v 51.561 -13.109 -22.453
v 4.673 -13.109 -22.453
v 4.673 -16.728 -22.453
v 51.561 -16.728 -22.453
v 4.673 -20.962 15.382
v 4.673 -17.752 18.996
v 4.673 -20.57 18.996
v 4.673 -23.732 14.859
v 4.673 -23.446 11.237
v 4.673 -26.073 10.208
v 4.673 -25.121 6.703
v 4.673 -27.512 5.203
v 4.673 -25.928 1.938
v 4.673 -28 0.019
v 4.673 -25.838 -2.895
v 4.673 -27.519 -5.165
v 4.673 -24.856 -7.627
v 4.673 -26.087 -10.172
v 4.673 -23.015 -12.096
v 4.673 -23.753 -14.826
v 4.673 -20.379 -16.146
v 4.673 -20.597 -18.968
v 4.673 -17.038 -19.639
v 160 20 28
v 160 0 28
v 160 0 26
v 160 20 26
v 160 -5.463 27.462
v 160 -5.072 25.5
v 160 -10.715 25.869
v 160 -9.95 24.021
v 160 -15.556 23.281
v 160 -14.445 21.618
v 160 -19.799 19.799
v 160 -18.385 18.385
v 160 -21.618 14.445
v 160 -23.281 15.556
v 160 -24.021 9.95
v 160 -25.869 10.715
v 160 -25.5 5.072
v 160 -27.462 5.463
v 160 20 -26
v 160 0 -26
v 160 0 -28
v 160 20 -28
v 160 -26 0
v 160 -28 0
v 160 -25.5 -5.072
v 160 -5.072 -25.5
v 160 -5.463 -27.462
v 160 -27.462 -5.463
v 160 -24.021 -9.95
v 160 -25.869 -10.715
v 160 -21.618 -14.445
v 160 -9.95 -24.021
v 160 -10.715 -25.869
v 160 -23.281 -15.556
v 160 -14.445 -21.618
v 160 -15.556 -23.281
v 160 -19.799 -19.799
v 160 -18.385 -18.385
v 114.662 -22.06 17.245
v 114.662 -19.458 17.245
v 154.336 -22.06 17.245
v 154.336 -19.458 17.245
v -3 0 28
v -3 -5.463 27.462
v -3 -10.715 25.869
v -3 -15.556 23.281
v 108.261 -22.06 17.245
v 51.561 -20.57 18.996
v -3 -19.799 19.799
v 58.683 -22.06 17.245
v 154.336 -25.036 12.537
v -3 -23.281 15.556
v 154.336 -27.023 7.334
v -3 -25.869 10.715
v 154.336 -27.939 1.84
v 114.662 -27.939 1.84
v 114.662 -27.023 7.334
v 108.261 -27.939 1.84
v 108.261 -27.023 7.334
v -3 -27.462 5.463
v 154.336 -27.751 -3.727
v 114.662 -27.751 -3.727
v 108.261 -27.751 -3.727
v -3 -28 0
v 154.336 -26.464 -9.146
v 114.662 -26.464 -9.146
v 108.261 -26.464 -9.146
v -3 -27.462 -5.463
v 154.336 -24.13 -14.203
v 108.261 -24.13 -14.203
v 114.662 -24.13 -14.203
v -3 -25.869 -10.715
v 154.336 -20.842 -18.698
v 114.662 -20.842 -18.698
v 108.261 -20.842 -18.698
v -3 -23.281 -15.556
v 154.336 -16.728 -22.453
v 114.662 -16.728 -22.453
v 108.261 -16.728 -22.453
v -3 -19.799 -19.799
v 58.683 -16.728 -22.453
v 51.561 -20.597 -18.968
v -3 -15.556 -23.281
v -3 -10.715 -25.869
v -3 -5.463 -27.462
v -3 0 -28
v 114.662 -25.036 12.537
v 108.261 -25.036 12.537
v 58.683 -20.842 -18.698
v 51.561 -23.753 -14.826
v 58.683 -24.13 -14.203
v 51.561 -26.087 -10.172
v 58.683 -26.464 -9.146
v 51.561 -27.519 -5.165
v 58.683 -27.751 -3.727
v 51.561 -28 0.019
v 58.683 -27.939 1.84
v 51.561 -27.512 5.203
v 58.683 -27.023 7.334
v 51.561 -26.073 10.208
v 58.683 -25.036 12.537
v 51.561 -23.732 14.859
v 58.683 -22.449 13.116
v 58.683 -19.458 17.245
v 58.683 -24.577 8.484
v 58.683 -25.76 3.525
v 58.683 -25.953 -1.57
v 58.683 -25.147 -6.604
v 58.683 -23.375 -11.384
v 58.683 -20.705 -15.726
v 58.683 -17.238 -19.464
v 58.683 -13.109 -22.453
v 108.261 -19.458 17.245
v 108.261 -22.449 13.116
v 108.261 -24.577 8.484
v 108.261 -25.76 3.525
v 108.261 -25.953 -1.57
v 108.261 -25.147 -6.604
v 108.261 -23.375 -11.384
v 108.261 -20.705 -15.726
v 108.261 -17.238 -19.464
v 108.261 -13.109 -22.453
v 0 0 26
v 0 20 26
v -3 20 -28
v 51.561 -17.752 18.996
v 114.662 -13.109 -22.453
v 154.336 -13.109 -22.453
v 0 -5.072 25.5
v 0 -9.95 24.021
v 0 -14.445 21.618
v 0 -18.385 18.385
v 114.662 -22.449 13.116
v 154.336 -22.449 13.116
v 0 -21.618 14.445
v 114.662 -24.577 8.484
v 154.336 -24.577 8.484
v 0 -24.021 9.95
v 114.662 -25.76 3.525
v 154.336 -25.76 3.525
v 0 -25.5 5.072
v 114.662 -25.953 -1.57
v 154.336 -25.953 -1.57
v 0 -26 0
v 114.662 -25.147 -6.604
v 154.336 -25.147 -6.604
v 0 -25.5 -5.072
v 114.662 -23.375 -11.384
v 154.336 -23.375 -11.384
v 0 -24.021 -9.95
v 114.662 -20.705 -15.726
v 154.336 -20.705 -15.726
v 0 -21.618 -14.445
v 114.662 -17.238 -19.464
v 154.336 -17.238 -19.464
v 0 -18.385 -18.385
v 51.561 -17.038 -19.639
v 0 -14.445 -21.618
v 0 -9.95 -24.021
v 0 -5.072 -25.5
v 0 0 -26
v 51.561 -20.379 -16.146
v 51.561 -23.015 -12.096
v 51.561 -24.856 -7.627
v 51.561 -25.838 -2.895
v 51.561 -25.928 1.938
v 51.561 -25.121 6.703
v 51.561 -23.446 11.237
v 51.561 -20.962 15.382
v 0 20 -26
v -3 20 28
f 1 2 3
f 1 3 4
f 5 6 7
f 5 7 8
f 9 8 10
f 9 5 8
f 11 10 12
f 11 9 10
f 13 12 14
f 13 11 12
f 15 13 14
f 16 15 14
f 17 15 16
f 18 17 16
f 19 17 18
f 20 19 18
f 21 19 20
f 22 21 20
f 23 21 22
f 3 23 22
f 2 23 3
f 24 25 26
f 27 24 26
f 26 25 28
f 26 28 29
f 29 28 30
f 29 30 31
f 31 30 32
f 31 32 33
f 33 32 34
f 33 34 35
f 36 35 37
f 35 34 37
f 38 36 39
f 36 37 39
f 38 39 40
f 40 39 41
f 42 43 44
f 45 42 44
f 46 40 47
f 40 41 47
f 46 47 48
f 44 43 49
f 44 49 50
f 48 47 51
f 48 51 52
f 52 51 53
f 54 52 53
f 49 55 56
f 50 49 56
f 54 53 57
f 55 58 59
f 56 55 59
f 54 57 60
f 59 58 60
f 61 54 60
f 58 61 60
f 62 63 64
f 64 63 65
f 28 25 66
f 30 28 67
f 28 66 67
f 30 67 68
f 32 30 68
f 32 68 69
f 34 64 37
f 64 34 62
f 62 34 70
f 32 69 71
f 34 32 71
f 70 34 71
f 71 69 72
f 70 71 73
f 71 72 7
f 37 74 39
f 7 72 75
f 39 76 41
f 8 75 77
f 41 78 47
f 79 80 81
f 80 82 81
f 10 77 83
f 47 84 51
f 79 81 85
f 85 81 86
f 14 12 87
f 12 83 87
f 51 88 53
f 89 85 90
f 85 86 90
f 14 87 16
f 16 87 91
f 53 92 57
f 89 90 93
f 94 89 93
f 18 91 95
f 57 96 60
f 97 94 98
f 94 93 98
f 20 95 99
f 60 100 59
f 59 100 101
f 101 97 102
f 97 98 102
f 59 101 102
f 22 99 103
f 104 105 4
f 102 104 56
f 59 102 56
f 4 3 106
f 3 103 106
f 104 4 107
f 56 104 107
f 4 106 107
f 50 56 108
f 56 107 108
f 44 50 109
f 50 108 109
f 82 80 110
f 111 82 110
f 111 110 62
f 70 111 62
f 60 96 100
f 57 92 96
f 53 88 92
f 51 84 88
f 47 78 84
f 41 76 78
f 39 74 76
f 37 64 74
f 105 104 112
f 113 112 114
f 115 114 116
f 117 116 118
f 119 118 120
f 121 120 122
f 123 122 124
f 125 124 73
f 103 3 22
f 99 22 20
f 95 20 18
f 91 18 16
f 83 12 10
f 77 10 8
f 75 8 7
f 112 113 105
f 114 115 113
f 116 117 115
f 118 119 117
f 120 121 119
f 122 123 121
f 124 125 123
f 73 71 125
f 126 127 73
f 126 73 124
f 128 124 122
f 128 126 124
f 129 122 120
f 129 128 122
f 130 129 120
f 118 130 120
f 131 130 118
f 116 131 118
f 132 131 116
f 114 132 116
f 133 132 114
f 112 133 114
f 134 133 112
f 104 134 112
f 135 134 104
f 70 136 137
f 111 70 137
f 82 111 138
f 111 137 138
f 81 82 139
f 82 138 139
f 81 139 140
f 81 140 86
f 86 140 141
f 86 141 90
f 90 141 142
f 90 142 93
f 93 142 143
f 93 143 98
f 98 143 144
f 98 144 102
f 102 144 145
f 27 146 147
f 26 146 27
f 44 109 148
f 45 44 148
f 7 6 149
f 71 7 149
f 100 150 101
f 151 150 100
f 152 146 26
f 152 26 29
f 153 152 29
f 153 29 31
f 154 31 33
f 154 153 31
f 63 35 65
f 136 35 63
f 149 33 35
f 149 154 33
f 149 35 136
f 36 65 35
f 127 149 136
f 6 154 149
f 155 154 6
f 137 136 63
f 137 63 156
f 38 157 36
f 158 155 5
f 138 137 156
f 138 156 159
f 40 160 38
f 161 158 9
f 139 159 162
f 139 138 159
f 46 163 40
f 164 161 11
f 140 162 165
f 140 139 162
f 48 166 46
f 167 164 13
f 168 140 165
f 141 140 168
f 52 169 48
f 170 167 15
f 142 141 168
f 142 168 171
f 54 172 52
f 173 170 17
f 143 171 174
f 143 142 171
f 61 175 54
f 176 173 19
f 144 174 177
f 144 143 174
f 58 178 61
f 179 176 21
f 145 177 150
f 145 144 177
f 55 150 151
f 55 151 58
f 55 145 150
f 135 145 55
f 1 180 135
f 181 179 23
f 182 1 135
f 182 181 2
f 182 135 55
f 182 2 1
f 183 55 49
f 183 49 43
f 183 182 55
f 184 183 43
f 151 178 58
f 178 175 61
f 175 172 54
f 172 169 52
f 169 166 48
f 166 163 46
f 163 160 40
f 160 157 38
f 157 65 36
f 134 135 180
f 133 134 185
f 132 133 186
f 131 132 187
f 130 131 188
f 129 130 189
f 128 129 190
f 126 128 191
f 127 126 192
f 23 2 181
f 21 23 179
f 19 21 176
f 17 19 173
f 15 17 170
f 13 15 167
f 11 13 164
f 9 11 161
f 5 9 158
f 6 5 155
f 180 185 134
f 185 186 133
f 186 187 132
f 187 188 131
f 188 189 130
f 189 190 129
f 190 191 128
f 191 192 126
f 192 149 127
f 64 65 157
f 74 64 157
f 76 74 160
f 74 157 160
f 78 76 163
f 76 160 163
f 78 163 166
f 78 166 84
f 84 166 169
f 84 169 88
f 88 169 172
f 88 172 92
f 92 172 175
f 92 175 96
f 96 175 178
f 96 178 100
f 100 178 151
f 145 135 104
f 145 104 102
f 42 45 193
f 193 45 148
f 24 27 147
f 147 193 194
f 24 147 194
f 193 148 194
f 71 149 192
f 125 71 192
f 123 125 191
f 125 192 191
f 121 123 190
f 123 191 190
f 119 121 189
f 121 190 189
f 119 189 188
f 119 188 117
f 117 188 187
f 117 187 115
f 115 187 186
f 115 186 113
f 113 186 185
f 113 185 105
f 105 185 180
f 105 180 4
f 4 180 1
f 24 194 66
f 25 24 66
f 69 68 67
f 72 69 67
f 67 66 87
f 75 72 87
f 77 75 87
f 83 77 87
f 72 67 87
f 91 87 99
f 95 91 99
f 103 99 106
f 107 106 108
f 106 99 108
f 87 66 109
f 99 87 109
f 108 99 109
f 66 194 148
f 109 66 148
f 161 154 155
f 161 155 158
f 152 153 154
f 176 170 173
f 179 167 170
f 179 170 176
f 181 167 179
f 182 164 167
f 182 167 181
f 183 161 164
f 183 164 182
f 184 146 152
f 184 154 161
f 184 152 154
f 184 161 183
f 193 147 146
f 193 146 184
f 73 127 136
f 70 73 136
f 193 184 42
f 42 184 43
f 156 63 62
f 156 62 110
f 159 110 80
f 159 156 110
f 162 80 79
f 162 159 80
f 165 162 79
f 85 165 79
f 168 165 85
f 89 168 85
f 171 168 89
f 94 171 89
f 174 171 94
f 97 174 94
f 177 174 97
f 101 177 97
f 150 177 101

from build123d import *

# Parameters (mm, degrees)
BOSS_EXTRUDE1_DEPTH = 160
SKETCH2_W           = 160
SKETCH2_H           = 2
BOSS_EXTRUDE2_DEPTH = 20
BOSS_EXTRUDE3_START = 3
BOSS_EXTRUDE3_DEPTH = 3
SKETCH4_W           = 46.887714477
SKETCH4_H           = 41.449681409
SKETCH4_W_2         = 49.578331284
SKETCH4_H_2         = 39.698074899
SKETCH4_W_3         = 39.67361458
CUT_EXTRUDE1_DEPTH  = 170.375322878


with BuildPart() as part:
    # Sketch1 → Boss-Extrude1 (new body)
    with BuildSketch(Plane(origin=(0, 0, 0), x_dir=(0, 0, -1), z_dir=(1, 0, 0))):
        with BuildLine():
            Line((26, 0), (28, 0))
            ThreePointArc((28, 0), (0, -28), (-28, 0))
            Line((-28, 0), (-26, 0))
            ThreePointArc((-26, 0), (0, -26), (26, 0))
        make_face()
    extrude(amount=BOSS_EXTRUDE1_DEPTH)

    # Sketch2 → Boss-Extrude2 (add)
    with BuildSketch(Plane(origin=(0, 0, 0), x_dir=(1, 0, 0), z_dir=(0, 1, 0))):
        with Locations((80, 27)):
            Rectangle(SKETCH2_W, SKETCH2_H)
        with Locations((80, -27)):
            Rectangle(SKETCH2_W, SKETCH2_H)
    extrude(amount=BOSS_EXTRUDE2_DEPTH)

    # Sketch3 → Boss-Extrude3 (add)
    with BuildSketch(Plane.ZY.offset(BOSS_EXTRUDE3_START)):
        with BuildLine():
            Line((-28, 20), (28, 20))
            Line((28, 20), (28, 0))
            ThreePointArc((28, 0), (0, -28), (-28, 0))
            Line((-28, 0), (-28, 20))
        make_face()
    extrude(amount=-BOSS_EXTRUDE3_DEPTH)

    # Sketch4 → Cut-Extrude1 (cut, through all)
    with BuildSketch(Plane(origin=(0, 20, 0), x_dir=(1, 0, 0), z_dir=(0, 1, 0))):
        with Locations((28.117150866, 1.72863595)):
            Rectangle(SKETCH4_W, SKETCH4_H)
        with Locations((83.472139496, 2.604439205)):
            Rectangle(SKETCH4_W_2, SKETCH4_H_2)
        with Locations((134.499287451, 2.604439205)):
            Rectangle(SKETCH4_W_3, SKETCH4_H_2)
    extrude(amount=-CUT_EXTRUDE1_DEPTH, mode=Mode.SUBTRACT)


solid = part.part
